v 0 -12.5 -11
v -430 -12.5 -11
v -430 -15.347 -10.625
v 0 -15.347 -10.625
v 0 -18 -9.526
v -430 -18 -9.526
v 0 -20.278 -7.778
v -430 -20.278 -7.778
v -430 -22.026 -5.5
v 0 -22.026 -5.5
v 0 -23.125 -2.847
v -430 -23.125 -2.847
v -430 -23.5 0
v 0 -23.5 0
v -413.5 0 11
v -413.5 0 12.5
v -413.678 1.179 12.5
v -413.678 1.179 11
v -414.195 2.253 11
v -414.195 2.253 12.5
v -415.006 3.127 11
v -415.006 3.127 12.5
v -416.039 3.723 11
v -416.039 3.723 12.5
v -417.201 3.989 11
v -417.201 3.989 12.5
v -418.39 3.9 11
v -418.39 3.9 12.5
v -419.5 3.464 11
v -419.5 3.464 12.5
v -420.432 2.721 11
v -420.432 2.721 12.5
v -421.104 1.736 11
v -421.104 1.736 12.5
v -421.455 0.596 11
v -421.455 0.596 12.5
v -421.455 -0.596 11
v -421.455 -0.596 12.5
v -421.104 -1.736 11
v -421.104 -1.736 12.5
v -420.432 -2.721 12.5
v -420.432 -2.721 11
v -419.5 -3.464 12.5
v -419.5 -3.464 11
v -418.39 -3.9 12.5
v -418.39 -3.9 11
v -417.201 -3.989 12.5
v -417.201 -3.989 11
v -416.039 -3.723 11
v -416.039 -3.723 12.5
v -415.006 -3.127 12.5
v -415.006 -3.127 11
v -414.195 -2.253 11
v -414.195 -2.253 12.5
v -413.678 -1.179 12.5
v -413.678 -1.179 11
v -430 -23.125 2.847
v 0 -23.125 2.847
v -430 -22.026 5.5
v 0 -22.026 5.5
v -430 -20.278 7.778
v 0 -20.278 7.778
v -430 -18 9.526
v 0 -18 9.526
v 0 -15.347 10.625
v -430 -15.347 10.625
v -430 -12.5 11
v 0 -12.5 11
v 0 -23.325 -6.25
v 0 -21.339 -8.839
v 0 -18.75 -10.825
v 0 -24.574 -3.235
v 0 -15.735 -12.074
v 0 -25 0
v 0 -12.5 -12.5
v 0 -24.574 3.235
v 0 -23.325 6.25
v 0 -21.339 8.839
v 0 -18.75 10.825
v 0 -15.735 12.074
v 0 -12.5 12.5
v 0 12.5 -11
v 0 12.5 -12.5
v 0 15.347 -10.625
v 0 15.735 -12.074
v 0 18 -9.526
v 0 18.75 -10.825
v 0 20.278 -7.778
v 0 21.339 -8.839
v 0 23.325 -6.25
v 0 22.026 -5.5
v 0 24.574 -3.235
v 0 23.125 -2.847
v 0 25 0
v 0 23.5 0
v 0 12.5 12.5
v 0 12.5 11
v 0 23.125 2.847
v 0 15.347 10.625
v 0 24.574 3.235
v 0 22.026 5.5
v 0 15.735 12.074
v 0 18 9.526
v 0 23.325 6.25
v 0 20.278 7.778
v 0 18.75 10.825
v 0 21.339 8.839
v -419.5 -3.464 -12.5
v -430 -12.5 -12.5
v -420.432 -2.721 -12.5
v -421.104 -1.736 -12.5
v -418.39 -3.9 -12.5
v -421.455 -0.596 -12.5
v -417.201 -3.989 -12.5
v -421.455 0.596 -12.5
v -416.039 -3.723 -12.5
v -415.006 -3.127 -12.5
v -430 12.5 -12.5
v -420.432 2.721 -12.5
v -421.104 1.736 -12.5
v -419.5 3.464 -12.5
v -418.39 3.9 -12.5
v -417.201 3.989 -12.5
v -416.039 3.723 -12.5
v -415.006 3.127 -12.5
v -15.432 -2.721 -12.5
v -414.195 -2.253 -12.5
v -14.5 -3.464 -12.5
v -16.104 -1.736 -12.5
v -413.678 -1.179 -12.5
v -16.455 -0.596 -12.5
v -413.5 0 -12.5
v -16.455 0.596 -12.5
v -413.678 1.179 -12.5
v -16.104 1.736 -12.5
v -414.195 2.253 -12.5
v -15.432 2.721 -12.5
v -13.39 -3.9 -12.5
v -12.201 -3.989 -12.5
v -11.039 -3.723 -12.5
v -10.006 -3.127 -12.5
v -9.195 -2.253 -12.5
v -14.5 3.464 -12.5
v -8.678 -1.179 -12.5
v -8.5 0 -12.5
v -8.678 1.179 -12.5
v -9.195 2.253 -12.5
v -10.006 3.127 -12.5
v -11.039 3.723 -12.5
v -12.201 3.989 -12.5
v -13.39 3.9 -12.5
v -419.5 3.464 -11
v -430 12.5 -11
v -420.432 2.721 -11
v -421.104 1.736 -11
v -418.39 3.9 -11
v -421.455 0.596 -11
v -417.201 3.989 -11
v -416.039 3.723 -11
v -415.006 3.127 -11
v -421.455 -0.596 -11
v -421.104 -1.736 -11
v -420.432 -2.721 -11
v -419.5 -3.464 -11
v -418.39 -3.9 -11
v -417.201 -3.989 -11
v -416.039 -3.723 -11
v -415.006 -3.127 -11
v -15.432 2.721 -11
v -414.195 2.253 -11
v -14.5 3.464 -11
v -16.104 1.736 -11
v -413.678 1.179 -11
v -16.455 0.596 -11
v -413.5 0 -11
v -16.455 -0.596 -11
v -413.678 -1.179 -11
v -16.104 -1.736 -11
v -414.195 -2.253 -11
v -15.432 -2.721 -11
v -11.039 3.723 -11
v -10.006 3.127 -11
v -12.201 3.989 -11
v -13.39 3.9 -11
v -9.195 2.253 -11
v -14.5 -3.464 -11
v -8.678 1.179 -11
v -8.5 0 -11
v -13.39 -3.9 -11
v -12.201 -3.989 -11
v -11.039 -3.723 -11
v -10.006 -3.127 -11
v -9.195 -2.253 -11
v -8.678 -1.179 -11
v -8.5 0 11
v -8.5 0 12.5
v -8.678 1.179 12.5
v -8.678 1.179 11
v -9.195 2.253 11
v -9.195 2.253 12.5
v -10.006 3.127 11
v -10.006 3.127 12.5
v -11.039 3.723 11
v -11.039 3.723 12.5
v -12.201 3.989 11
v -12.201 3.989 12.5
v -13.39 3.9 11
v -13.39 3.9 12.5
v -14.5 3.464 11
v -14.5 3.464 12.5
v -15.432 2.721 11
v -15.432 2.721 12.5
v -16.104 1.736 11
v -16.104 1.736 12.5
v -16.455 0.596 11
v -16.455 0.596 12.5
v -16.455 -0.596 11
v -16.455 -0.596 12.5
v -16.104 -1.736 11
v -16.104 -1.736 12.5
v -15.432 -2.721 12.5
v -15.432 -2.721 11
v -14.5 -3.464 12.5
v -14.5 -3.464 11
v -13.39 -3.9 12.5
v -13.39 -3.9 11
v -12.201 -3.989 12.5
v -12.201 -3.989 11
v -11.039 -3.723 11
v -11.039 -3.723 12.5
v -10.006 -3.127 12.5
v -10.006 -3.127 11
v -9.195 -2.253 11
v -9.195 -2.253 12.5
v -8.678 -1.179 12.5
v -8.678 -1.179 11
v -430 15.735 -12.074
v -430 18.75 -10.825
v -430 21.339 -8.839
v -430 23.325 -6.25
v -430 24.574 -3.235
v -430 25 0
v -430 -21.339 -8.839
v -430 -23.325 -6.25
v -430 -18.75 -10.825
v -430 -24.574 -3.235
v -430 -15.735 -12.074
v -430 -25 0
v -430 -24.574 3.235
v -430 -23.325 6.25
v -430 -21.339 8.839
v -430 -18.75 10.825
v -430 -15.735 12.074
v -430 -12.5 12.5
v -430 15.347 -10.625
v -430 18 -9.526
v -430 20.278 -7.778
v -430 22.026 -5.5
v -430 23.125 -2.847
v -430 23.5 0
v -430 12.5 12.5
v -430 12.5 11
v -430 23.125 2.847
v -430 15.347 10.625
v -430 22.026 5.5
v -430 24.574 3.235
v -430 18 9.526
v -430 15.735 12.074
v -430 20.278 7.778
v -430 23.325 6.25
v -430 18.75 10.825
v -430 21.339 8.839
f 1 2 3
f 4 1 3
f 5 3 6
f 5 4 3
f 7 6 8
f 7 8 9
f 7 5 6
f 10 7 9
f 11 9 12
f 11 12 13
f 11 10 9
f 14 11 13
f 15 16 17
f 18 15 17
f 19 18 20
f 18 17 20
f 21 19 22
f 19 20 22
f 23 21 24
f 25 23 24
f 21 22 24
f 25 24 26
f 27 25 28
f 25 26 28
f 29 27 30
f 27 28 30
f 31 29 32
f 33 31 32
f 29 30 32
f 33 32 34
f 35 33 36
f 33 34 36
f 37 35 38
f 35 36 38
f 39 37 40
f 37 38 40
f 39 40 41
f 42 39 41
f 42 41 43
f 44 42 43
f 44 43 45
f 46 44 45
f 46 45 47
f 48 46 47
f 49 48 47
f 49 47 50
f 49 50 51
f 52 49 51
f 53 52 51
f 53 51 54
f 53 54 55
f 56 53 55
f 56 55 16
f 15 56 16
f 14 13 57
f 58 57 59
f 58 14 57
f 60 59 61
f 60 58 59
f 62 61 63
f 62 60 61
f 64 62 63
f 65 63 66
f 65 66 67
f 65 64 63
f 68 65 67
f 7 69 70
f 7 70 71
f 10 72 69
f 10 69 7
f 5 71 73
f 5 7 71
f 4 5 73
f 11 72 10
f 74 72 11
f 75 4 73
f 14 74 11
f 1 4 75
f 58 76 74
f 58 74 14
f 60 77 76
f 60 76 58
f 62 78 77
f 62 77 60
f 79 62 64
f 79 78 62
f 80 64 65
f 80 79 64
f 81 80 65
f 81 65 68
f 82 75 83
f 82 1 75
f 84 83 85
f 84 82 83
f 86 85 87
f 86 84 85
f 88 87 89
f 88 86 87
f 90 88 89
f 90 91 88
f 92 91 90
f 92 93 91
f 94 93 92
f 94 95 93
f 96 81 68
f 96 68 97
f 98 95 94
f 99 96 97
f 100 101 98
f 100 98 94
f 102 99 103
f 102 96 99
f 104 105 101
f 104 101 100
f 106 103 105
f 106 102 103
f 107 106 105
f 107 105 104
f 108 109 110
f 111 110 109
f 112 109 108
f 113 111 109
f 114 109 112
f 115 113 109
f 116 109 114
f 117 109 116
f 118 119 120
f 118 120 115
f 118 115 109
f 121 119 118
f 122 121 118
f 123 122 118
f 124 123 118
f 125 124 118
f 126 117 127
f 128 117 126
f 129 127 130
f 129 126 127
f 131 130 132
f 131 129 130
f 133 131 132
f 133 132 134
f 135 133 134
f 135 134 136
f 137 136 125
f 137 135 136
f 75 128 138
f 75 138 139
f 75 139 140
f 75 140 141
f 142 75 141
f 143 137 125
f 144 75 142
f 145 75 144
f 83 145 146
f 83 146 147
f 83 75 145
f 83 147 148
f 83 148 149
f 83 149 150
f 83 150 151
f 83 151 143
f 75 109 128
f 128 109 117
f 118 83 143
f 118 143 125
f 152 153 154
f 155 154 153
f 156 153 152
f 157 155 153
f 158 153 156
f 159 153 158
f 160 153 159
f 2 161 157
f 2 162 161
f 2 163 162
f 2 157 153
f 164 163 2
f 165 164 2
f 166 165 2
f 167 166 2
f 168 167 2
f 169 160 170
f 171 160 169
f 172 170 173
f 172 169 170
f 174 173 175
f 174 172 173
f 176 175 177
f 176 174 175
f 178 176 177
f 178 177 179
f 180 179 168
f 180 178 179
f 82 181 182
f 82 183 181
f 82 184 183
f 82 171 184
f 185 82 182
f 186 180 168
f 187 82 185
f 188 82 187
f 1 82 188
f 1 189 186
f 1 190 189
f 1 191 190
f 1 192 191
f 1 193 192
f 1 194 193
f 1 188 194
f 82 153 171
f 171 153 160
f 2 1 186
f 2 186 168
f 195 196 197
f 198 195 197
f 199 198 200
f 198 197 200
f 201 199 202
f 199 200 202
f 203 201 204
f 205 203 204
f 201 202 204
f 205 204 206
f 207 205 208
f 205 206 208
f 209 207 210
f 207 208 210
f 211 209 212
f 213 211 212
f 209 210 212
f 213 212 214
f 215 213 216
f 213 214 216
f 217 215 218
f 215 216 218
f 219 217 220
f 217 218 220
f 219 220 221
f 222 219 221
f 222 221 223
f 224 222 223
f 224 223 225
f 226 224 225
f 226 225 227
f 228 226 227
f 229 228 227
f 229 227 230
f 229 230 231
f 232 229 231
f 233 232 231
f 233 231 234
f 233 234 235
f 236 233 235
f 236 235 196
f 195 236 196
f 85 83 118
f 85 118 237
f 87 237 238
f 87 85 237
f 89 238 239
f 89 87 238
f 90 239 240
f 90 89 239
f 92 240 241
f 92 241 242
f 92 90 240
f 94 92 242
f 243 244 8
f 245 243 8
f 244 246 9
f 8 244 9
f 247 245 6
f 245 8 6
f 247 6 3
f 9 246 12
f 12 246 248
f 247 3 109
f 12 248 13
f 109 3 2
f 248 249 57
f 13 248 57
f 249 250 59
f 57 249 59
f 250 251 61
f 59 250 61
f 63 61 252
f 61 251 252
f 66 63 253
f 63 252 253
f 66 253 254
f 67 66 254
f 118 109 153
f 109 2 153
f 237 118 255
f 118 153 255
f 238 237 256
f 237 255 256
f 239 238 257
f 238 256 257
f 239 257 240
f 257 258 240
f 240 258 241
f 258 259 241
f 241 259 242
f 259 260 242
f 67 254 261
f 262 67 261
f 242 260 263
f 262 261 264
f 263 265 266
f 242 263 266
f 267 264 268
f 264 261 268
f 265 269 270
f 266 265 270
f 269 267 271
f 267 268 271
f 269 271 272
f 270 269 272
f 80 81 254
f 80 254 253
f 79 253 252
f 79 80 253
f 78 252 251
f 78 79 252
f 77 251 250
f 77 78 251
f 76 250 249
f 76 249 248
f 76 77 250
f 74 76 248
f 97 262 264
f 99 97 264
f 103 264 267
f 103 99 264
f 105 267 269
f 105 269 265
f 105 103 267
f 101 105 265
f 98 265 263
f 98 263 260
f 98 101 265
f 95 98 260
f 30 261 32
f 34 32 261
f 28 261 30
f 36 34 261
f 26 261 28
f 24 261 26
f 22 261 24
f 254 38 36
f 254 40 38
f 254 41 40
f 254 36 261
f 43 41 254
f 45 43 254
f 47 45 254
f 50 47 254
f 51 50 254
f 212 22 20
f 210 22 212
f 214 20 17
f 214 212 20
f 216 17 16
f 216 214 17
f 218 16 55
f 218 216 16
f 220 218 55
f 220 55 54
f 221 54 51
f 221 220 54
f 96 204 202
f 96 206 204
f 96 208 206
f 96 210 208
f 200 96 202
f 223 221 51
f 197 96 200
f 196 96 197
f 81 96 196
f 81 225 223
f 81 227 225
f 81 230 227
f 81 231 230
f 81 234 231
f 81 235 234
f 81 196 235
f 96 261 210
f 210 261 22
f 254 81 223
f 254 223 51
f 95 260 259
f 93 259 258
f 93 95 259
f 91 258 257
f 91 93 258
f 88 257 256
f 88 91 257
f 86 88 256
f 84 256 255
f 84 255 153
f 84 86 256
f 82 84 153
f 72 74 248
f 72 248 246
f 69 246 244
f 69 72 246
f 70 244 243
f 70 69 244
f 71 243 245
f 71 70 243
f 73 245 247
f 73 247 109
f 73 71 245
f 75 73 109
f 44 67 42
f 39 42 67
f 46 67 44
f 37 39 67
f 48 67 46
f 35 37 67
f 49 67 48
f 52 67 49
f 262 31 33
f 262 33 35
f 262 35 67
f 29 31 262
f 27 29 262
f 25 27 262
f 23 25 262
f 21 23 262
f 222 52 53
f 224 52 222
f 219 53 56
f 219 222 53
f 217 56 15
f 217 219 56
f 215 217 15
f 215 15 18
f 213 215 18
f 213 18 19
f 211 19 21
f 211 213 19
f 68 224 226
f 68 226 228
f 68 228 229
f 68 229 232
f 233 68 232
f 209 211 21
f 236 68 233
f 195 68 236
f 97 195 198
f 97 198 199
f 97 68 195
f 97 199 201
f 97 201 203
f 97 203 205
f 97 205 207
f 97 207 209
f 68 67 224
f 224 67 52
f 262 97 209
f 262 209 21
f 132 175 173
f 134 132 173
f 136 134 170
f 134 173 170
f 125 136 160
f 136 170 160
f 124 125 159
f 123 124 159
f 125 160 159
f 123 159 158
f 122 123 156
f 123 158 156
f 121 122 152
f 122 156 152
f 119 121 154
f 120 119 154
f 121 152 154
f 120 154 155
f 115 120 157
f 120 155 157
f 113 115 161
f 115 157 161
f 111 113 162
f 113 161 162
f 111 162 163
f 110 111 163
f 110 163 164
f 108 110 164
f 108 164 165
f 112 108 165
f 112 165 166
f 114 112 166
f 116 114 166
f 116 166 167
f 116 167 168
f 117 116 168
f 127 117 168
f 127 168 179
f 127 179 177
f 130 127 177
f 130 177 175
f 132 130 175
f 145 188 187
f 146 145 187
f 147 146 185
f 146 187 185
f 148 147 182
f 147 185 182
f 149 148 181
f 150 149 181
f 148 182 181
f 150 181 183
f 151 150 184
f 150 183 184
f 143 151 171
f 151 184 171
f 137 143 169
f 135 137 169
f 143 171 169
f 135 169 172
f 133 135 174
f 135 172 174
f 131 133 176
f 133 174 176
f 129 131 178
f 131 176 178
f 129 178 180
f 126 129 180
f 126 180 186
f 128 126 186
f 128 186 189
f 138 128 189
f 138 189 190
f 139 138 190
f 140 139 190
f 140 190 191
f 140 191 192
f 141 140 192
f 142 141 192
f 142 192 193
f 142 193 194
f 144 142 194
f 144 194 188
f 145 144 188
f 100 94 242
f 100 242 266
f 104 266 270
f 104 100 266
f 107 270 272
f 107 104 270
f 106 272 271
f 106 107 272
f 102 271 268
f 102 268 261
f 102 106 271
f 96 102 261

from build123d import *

# Parameters (mm, degrees)
F1_DEPTH = 430
F2_R     = 4
F3_DEPTH = 30


with BuildPart() as f1:
    # F0 (on Right) → F1 (new body)
    with BuildSketch(Plane.YZ):
        with BuildLine():
            Line((12.5, 12.5), (-12.5, 12.5))
            ThreePointArc((-12.5, 12.5), (-21.338835, 8.838835), (-25, 0))
            ThreePointArc((-25, 0), (-21.338835, -8.838835), (-12.5, -12.5))
            Line((-12.5, -12.5), (12.5, -12.5))
            ThreePointArc((12.5, -12.5), (21.338835, -8.838835), (25, 0))
            ThreePointArc((25, 0), (21.338835, 8.838835), (12.5, 12.5))
        make_face()
        with BuildLine():
            Line((-12.5, 11), (12.5, 11))
            ThreePointArc((12.5, 11), (20.278175, 7.778175), (23.5, 0))
            ThreePointArc((23.5, 0), (20.278175, -7.778175), (12.5, -11))
            Line((12.5, -11), (-12.5, -11))
            ThreePointArc((-12.5, -11), (-20.278175, -7.778175), (-23.5, 0))
            ThreePointArc((-23.5, 0), (-20.278175, 7.778175), (-12.5, 11))
        make_face(mode=Mode.SUBTRACT)
    extrude(amount=-F1_DEPTH)

    # F2 (on face) → F3 (cut)
    with BuildSketch(Plane.XY.offset(12.5)):
        with Locations((-12.5, 0)):
            Circle(F2_R)
        with Locations((-417.5, 0)):
            Circle(F2_R)
    extrude(amount=-F3_DEPTH, mode=Mode.SUBTRACT)


solid = f1.part
